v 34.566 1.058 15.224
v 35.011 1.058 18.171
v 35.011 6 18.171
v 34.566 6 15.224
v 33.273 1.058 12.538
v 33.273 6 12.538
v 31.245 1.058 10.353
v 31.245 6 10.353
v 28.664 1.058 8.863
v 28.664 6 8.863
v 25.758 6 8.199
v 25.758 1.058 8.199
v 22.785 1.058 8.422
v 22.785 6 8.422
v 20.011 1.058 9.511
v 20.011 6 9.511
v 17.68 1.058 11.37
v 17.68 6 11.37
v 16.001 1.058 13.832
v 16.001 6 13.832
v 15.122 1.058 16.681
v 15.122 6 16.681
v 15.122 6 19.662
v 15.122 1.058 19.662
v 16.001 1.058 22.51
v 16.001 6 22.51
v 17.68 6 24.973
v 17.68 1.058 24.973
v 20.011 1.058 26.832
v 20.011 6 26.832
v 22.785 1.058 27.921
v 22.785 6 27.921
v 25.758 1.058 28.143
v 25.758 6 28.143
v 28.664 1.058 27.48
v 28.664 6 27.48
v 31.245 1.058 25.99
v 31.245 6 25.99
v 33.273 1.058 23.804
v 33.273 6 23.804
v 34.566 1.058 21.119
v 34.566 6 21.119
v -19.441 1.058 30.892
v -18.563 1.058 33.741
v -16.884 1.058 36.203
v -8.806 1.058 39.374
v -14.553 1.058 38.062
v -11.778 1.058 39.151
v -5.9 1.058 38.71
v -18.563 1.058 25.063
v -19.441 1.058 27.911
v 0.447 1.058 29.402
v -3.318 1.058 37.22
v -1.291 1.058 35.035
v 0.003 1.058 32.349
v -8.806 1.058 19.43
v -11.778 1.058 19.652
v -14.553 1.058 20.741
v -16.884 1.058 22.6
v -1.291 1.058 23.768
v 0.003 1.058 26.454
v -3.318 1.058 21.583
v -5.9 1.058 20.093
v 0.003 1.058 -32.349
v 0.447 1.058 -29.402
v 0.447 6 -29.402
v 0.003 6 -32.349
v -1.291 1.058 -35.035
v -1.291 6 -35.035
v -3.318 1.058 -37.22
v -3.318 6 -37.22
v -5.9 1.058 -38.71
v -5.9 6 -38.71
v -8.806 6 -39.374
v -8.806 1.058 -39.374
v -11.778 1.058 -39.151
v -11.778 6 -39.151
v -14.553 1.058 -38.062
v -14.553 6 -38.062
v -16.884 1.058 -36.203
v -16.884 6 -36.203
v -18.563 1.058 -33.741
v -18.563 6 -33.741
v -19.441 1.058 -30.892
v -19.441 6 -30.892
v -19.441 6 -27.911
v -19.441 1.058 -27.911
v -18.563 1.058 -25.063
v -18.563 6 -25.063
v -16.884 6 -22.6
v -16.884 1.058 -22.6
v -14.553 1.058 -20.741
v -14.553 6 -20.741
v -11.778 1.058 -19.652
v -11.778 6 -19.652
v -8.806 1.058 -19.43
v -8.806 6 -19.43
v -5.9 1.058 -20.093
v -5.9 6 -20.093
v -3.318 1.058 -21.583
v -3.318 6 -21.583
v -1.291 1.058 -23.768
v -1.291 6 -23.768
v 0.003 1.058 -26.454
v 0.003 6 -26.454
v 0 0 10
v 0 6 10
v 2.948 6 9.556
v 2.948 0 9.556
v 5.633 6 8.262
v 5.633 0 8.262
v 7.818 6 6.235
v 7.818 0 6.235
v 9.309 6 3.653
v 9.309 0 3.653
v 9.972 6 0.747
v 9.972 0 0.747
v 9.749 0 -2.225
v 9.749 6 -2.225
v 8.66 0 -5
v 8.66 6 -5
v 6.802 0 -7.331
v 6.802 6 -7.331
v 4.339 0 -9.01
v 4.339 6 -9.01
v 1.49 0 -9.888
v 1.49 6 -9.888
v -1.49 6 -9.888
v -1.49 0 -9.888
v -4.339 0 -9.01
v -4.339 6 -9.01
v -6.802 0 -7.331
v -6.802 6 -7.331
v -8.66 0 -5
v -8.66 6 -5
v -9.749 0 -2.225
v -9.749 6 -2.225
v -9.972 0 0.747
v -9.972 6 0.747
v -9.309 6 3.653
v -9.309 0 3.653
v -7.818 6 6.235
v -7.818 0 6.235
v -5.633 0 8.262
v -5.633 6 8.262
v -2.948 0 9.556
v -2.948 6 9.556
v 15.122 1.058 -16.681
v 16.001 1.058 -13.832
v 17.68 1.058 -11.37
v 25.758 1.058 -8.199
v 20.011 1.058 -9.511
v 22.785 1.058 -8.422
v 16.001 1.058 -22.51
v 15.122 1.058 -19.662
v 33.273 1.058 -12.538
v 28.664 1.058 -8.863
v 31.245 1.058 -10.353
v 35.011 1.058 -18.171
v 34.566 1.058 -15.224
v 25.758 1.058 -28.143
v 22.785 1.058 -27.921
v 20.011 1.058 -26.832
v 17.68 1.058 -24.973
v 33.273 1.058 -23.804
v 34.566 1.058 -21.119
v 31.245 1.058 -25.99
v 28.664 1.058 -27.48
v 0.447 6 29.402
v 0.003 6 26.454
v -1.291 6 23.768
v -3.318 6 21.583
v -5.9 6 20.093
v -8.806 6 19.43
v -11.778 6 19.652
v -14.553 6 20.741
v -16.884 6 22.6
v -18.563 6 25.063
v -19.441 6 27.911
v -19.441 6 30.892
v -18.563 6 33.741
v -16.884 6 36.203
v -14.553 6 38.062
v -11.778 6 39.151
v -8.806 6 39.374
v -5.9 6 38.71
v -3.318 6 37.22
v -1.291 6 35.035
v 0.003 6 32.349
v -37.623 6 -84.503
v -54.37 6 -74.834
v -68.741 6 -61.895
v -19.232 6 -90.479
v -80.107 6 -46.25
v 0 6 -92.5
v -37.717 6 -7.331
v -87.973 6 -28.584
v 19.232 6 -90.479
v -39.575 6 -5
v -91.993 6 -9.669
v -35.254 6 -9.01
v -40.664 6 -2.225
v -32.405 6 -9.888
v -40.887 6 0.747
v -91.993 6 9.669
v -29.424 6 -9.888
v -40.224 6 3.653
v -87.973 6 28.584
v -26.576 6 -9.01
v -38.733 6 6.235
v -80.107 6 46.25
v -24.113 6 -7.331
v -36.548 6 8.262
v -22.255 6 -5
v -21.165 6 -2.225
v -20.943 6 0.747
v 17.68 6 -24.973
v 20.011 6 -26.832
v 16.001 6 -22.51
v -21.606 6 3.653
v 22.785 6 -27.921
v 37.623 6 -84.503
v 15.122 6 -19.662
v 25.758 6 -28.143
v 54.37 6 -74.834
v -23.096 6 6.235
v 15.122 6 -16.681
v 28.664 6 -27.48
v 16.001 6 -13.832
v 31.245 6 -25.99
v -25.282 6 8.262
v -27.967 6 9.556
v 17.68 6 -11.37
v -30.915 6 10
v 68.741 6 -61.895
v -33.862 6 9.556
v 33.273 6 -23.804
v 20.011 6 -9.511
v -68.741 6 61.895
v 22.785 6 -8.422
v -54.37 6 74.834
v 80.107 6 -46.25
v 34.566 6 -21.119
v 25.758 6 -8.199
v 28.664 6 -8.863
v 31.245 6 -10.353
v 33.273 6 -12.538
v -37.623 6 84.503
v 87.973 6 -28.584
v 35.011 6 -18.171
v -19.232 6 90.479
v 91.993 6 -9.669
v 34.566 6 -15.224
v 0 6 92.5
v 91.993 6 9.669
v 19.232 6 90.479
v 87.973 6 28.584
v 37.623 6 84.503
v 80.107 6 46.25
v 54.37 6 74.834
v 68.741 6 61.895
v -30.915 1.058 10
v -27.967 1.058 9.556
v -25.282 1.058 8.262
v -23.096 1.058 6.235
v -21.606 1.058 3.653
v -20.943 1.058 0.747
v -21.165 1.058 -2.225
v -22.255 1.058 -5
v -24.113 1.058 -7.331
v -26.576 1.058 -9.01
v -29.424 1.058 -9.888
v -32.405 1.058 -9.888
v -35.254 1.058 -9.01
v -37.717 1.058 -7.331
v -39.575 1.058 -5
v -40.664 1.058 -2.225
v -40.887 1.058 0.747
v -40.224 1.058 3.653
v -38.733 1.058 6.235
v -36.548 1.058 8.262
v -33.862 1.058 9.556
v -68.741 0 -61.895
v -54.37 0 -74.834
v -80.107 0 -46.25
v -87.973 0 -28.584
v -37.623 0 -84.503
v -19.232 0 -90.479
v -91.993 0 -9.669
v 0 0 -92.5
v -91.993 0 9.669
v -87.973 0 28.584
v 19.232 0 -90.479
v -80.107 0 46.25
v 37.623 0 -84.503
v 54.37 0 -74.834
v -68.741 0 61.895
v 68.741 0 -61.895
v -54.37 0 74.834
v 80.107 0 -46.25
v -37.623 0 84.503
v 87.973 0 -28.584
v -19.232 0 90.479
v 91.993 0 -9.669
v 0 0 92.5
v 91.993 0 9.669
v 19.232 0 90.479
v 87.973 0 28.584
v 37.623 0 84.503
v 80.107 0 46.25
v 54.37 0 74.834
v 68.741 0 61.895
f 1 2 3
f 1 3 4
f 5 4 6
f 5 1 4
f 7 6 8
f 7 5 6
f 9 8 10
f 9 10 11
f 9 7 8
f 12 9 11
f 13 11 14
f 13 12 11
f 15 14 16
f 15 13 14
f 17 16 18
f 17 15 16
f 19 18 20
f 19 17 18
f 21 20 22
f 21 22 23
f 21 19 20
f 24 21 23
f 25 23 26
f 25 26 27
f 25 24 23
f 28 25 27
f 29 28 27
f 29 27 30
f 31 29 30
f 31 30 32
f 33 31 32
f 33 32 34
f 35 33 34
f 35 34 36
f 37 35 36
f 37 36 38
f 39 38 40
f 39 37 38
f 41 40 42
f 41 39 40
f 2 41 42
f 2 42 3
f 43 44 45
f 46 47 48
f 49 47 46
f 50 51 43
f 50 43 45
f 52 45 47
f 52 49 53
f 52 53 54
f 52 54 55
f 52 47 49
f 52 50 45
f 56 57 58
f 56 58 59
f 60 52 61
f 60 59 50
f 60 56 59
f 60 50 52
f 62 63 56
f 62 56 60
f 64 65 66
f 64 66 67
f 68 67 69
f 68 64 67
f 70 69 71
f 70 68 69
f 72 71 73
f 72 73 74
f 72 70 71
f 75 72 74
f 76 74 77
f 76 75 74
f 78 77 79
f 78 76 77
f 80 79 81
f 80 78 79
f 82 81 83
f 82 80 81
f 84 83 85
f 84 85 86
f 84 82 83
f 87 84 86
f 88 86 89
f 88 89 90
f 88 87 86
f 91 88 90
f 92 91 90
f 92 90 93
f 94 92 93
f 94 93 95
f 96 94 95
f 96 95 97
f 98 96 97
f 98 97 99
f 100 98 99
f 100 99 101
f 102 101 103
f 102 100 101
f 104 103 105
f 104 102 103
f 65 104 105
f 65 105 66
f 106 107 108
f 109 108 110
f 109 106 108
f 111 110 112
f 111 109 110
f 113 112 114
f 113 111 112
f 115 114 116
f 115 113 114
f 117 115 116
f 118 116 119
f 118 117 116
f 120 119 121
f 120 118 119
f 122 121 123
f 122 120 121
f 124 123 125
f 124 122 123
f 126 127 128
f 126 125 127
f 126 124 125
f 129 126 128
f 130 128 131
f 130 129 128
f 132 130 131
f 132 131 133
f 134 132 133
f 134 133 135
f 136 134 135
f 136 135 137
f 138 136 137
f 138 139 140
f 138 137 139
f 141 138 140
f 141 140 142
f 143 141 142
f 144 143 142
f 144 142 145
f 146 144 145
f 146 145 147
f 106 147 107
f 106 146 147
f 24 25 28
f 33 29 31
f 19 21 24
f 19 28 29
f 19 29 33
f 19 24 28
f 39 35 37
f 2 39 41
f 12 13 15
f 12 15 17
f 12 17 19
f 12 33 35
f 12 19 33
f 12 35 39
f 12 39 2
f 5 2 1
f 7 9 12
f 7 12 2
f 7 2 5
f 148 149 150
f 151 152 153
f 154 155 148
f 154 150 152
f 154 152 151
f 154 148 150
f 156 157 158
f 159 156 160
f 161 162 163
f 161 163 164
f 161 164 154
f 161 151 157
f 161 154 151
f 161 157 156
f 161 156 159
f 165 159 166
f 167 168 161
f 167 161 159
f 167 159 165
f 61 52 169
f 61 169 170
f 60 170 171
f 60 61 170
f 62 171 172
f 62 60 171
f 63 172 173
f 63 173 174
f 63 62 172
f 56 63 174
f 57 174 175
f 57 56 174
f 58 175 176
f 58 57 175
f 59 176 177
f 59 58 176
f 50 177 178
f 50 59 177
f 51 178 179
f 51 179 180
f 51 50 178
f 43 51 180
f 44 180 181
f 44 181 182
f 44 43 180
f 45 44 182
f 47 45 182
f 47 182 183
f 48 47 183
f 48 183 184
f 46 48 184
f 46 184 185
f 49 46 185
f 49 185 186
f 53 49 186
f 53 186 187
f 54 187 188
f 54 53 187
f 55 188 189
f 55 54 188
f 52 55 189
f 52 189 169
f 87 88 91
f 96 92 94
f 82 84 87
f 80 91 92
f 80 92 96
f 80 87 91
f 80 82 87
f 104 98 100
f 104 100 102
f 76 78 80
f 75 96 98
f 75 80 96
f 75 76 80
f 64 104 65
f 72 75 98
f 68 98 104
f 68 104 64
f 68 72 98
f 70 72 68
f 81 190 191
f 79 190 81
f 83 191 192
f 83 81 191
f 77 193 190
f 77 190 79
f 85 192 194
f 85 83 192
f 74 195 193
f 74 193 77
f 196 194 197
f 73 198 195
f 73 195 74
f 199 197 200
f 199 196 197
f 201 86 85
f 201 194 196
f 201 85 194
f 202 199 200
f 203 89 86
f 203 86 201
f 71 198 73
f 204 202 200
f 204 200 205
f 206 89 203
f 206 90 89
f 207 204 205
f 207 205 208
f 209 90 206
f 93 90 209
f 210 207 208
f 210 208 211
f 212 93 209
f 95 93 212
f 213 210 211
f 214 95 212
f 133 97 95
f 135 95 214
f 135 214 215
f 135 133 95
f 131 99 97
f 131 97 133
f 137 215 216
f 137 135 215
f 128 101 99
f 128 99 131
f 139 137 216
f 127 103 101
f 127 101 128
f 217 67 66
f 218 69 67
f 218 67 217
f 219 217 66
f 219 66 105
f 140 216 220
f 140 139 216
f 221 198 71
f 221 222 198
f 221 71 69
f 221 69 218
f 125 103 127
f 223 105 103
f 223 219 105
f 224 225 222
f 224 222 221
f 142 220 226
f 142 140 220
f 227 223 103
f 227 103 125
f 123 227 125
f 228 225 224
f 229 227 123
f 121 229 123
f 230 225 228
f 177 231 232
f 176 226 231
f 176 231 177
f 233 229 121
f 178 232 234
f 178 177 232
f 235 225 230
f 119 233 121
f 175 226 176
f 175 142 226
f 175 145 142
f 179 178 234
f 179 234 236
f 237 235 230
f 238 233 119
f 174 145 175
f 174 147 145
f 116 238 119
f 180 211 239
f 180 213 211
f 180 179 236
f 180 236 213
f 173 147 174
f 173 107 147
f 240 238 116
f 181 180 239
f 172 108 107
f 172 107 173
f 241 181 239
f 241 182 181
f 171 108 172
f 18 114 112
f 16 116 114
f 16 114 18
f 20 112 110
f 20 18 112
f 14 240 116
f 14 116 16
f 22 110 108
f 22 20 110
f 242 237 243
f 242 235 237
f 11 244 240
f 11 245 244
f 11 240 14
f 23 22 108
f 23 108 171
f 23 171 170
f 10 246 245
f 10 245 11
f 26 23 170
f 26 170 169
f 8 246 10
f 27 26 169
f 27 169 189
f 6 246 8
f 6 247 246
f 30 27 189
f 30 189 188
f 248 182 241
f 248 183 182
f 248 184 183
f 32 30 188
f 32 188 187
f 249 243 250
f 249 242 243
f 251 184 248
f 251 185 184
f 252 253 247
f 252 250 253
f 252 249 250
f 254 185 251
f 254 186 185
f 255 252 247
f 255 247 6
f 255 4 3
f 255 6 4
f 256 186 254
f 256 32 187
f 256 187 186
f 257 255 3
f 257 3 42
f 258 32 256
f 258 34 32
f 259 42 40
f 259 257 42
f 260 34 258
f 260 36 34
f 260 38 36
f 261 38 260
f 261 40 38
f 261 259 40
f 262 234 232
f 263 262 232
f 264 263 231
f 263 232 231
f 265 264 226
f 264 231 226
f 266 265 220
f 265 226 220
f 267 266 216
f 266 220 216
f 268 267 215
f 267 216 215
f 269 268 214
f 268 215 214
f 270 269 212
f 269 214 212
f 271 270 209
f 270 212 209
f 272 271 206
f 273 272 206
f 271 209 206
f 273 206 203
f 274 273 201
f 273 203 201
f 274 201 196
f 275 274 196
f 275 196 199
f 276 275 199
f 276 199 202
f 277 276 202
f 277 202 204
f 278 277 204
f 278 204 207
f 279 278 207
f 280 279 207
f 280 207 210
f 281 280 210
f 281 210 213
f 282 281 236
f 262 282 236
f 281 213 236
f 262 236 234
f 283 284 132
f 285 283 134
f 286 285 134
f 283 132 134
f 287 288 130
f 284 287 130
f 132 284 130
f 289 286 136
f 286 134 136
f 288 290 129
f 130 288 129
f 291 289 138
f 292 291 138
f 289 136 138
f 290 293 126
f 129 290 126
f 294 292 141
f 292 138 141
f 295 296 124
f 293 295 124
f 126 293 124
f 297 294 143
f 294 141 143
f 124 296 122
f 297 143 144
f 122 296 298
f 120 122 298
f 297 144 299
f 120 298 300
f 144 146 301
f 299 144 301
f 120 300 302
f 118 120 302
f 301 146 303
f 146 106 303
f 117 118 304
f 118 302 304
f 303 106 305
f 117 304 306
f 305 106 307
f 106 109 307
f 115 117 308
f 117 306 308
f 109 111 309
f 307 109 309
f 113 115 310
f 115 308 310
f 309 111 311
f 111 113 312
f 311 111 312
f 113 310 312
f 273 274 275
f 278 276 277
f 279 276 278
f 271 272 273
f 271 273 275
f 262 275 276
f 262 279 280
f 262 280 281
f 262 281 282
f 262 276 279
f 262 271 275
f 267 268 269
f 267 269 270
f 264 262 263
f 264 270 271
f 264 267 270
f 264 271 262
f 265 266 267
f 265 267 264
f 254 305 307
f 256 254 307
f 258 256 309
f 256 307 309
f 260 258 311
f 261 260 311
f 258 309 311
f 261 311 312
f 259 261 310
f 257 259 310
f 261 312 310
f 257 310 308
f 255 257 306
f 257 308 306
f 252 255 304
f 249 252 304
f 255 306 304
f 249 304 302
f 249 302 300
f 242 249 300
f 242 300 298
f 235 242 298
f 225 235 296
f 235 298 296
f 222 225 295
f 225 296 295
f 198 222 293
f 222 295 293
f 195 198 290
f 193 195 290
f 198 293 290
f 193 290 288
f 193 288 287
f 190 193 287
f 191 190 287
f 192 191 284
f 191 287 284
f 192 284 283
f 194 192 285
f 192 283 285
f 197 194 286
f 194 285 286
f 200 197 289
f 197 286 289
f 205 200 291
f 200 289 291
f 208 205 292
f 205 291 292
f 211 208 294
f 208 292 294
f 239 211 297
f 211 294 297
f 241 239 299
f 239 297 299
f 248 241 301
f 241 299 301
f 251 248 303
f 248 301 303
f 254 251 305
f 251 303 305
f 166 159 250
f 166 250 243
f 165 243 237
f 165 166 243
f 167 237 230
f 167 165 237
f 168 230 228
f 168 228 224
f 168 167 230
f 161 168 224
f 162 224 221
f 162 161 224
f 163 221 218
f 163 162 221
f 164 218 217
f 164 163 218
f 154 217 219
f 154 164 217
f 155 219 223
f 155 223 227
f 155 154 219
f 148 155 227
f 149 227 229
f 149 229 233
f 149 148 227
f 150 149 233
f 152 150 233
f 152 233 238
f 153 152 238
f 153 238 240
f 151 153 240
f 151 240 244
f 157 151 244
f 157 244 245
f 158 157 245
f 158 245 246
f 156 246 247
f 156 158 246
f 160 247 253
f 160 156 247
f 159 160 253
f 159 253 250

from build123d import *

# Parameters (mm, degrees)
SKETCH1_R           = 92.5
BOSS_EXTRUDE1_DEPTH = 6
SKETCH2_R           = 10
CUT_EXTRUDE1_DEPTH  = 131.952281385
SKETCH3_R           = 10
CUT_EXTRUDE2_DEPTH  = 4.941973012
CIRPATTERN1_COUNT   = 5


with BuildPart() as part:
    # Sketch1 → Boss-Extrude1 (new body)
    with BuildSketch(Plane(origin=(0, 0, 0), x_dir=(1, 0, 0), z_dir=(0, 1, 0))):
        Circle(SKETCH1_R)
    extrude(amount=BOSS_EXTRUDE1_DEPTH)

    # Sketch2 → Cut-Extrude1 (cut, through all)
    with BuildSketch(Plane(origin=(0, 0, 0), x_dir=(1, 0, 0), z_dir=(0, 1, 0))):
        Circle(SKETCH2_R)
    extrude(amount=CUT_EXTRUDE1_DEPTH, mode=Mode.SUBTRACT)

    # Sketch3 → Cut-Extrude2 (cut)
    with BuildSketch(Plane(origin=(0, 6, 0), x_dir=(1, 0, 0), z_dir=(0, 1, 0))):
        with Locations((-30.914776162, 0)):
            Circle(SKETCH3_R)
    cut_extrude2 = extrude(amount=-CUT_EXTRUDE2_DEPTH, mode=Mode.SUBTRACT)

    # CirPattern1: Cut-Extrude2 ×5 about axis
    cirpattern1_axis = Axis((0, 0, 0), (0, 1, 0))
    for i in range(1, CIRPATTERN1_COUNT):
        add(cut_extrude2.rotate(cirpattern1_axis, i * 360 / CIRPATTERN1_COUNT), mode=Mode.SUBTRACT)


solid = part.part
